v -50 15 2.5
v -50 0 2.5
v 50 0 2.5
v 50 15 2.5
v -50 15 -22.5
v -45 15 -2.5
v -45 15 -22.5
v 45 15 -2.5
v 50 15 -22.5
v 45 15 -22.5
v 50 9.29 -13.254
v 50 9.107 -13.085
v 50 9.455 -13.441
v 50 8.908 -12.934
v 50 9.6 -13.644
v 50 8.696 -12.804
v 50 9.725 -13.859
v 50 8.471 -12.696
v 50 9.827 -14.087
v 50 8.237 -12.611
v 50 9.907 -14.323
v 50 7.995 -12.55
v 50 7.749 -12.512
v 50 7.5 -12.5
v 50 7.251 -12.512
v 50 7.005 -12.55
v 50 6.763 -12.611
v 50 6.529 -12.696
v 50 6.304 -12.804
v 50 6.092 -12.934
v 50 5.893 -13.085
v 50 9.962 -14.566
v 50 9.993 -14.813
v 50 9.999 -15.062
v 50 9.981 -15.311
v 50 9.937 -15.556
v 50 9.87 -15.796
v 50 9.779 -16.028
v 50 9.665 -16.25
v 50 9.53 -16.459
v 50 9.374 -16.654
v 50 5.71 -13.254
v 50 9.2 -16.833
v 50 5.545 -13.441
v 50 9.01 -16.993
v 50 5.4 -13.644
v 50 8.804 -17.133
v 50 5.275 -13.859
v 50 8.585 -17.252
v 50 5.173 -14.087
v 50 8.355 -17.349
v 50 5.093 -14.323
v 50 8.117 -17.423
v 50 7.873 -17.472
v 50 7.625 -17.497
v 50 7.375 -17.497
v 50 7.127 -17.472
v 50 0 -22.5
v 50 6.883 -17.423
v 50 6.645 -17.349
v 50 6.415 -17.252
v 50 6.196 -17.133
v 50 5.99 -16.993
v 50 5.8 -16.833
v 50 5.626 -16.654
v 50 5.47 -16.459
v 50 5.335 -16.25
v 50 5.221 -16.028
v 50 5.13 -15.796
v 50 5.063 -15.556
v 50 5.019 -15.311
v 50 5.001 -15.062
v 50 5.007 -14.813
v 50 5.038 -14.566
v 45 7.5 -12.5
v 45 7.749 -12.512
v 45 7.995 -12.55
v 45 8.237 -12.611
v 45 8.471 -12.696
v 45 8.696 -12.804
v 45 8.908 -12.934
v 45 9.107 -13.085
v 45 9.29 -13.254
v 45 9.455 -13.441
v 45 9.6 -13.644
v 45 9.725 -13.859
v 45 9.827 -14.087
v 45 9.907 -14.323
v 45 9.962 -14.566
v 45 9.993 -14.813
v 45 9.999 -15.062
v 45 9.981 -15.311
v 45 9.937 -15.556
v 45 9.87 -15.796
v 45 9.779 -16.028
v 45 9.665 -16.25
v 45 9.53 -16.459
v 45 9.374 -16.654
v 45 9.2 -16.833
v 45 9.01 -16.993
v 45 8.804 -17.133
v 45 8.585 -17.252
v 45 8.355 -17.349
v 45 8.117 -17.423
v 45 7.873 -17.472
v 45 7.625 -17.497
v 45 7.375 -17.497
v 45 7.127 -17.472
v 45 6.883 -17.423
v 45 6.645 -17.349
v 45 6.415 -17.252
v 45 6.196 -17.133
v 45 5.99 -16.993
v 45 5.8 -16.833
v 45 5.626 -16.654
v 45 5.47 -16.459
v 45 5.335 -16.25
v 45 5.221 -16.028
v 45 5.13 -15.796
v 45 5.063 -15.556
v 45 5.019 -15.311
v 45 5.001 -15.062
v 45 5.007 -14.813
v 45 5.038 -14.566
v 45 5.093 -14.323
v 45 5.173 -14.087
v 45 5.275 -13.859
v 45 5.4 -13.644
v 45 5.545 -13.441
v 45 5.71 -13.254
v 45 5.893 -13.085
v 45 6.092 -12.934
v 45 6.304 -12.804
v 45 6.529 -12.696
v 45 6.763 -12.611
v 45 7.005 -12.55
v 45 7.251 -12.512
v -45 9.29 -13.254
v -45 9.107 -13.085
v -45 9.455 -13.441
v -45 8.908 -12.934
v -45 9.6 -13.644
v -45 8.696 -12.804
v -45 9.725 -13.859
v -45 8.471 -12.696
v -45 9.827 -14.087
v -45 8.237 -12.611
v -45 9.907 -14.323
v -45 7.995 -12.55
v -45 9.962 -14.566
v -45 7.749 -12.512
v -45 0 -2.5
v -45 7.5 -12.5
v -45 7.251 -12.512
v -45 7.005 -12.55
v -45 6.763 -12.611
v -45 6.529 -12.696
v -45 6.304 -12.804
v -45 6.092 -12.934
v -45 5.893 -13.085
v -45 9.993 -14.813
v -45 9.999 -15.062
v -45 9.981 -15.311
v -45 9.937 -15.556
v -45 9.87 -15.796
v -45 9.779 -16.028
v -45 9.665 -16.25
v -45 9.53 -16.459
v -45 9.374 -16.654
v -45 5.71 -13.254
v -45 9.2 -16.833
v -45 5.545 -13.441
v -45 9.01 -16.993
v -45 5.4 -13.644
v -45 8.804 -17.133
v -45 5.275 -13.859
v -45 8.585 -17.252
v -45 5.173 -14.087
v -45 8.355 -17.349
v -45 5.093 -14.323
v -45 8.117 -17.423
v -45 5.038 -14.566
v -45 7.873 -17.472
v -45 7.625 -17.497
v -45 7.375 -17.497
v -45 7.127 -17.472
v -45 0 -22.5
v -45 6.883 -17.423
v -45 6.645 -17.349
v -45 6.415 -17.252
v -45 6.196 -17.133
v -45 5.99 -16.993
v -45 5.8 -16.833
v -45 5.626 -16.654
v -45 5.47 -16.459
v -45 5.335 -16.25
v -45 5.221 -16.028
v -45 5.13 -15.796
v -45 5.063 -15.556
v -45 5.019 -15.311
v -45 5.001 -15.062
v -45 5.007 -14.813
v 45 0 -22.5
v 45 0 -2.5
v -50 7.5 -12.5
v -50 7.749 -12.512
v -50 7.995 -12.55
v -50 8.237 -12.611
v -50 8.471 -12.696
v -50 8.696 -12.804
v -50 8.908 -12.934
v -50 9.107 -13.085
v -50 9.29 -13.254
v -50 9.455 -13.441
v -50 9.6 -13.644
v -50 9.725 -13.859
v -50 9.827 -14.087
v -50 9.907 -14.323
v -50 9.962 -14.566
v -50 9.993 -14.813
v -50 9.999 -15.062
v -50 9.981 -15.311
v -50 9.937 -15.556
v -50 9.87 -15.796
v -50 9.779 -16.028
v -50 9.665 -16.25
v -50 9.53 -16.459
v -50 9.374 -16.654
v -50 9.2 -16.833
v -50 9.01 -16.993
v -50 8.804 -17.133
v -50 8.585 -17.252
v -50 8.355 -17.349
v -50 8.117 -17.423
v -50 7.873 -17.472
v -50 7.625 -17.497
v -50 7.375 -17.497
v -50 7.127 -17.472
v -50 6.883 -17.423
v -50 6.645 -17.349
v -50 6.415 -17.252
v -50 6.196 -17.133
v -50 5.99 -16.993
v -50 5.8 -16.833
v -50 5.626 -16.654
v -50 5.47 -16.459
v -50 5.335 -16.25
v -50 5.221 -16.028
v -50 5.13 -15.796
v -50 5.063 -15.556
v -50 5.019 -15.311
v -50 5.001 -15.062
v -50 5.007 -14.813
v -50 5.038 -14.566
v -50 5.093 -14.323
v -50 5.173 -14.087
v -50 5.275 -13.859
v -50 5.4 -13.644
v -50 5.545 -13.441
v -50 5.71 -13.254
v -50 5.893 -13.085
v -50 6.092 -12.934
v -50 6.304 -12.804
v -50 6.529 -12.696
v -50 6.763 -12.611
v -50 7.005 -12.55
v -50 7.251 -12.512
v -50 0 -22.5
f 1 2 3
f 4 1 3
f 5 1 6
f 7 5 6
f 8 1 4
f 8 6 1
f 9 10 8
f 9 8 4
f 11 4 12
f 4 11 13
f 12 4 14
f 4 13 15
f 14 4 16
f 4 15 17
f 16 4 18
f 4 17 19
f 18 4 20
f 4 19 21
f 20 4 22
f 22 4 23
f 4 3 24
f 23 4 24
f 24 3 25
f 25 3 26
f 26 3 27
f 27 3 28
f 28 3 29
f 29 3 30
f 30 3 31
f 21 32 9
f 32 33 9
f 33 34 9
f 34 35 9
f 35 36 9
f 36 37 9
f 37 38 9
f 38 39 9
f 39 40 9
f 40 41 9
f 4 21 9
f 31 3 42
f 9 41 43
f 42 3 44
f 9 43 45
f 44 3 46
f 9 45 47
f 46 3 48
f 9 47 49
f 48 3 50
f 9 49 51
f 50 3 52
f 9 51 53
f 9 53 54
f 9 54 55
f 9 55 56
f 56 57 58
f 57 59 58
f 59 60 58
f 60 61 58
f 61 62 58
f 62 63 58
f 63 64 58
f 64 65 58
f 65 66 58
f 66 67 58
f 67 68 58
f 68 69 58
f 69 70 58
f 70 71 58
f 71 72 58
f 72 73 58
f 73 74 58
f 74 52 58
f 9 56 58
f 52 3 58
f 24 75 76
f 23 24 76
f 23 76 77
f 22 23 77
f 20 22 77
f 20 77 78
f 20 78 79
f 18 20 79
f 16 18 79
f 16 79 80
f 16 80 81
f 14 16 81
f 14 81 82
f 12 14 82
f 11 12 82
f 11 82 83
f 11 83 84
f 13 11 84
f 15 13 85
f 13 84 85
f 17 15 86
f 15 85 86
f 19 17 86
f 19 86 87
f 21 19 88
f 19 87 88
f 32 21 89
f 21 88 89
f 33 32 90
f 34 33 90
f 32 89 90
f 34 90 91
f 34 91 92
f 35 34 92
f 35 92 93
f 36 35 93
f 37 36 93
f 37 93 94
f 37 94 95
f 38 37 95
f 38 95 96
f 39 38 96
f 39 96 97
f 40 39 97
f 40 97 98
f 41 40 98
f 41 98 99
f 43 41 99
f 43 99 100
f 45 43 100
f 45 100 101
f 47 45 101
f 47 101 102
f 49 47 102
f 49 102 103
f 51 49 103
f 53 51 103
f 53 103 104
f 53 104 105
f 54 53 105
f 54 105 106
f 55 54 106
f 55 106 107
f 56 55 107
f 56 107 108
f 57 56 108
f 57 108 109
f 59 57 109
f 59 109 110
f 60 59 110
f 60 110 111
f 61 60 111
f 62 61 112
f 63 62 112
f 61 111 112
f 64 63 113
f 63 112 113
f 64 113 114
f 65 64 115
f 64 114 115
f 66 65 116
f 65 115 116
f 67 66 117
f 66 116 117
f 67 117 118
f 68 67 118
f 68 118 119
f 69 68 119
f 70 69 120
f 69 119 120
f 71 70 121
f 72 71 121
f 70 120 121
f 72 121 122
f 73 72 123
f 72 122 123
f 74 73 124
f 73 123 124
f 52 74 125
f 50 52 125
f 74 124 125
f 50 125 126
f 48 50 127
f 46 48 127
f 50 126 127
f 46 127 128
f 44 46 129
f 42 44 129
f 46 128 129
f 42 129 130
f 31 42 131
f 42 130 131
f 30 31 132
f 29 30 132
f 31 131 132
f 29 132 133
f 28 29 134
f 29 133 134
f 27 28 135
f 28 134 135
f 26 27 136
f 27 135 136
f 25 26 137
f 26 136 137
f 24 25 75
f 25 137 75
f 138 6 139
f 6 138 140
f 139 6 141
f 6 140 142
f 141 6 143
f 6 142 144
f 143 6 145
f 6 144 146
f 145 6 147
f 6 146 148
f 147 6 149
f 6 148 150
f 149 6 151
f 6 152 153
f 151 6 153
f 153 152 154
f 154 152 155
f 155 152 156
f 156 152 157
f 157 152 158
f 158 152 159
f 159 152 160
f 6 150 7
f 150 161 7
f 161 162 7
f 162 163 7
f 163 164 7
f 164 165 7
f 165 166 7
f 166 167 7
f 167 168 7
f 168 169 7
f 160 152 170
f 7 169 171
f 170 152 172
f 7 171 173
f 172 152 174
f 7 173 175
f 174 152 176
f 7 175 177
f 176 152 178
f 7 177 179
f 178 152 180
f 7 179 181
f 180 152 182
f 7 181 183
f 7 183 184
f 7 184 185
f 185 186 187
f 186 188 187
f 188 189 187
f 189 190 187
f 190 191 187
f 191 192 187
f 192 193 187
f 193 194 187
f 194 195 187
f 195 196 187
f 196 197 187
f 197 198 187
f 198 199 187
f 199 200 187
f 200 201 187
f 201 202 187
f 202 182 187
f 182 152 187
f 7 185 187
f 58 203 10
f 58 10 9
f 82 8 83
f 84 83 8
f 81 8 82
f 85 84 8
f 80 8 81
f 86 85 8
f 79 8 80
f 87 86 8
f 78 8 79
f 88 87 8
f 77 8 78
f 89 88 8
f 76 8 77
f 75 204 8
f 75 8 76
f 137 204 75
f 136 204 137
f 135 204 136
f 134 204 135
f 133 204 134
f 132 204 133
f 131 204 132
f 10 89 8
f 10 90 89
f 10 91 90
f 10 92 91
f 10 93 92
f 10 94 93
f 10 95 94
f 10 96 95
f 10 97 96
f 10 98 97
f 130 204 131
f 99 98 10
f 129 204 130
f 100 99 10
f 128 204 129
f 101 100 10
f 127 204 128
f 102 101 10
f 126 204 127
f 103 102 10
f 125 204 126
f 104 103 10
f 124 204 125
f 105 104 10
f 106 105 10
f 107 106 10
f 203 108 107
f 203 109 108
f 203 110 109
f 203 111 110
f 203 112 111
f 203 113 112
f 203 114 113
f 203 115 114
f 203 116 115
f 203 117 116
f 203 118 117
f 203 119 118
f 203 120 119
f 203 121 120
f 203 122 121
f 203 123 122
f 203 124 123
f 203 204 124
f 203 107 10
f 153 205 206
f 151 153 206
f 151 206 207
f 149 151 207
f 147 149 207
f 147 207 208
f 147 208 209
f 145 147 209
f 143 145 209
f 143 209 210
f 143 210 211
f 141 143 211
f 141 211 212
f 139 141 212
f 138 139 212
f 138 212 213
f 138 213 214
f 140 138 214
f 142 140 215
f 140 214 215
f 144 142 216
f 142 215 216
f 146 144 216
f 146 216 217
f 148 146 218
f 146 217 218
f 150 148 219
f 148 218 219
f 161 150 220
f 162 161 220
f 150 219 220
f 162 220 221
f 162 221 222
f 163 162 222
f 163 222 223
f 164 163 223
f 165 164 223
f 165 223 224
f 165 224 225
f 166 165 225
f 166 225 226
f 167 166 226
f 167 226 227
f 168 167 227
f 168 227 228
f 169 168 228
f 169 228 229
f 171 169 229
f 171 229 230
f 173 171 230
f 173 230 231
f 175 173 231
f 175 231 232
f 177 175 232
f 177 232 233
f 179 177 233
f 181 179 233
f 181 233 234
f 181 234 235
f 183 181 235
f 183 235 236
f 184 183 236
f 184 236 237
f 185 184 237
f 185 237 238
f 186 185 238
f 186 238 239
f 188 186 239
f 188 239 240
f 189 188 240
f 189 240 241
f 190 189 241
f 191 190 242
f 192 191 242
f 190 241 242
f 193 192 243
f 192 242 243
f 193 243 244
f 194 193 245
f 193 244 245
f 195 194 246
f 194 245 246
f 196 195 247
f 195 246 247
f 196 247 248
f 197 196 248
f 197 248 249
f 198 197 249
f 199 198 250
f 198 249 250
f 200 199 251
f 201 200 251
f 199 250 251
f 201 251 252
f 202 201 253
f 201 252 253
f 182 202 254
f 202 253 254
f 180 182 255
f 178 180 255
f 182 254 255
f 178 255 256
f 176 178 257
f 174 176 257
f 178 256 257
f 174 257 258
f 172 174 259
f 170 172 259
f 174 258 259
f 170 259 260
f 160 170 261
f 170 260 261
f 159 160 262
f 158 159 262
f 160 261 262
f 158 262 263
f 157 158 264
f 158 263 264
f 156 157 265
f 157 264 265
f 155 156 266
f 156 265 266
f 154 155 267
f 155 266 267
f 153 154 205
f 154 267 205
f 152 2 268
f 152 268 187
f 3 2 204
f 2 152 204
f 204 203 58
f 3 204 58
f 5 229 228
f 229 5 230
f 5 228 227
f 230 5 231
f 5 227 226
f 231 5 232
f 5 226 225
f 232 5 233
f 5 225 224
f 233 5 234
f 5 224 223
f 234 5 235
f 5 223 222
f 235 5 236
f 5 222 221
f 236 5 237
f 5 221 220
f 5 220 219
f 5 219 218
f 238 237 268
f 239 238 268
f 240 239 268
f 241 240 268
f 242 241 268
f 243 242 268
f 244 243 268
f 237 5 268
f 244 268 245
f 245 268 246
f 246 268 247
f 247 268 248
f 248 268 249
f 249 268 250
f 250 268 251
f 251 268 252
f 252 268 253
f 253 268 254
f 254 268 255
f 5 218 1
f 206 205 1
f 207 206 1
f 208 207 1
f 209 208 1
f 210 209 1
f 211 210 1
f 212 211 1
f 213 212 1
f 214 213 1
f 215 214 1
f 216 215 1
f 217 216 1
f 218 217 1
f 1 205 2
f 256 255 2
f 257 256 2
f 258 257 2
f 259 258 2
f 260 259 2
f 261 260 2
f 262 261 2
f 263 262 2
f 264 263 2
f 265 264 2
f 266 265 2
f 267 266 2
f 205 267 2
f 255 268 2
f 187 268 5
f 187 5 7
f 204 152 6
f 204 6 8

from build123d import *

# Parameters (mm, degrees)
SKETCH1_W           = 100
SKETCH1_H           = 5
SKETCH1_W_2         = 5
SKETCH1_H_2         = 20
BOSS_EXTRUDE1_DEPTH = 15
SKETCH2_R           = 2.5
CUT_EXTRUDE1_DEPTH  = 104.591746776


with BuildPart() as part:
    # Sketch1 → Boss-Extrude1 (new body)
    with BuildSketch(Plane(origin=(0, 0, 0), x_dir=(1, 0, 0), z_dir=(0, 1, 0))):
        Rectangle(SKETCH1_W, SKETCH1_H)
        with Locations((-47.5, 12.5)):
            Rectangle(SKETCH1_W_2, SKETCH1_H_2)
        with Locations((47.5, 12.5)):
            Rectangle(SKETCH1_W_2, SKETCH1_H_2)
    extrude(amount=BOSS_EXTRUDE1_DEPTH)

    # Sketch2 → Cut-Extrude1 (cut, through all)
    with BuildSketch(Plane.ZY.offset(50)):
        with Locations((-15, 7.5)):
            Circle(SKETCH2_R)
    extrude(amount=-CUT_EXTRUDE1_DEPTH, mode=Mode.SUBTRACT)


solid = part.part
